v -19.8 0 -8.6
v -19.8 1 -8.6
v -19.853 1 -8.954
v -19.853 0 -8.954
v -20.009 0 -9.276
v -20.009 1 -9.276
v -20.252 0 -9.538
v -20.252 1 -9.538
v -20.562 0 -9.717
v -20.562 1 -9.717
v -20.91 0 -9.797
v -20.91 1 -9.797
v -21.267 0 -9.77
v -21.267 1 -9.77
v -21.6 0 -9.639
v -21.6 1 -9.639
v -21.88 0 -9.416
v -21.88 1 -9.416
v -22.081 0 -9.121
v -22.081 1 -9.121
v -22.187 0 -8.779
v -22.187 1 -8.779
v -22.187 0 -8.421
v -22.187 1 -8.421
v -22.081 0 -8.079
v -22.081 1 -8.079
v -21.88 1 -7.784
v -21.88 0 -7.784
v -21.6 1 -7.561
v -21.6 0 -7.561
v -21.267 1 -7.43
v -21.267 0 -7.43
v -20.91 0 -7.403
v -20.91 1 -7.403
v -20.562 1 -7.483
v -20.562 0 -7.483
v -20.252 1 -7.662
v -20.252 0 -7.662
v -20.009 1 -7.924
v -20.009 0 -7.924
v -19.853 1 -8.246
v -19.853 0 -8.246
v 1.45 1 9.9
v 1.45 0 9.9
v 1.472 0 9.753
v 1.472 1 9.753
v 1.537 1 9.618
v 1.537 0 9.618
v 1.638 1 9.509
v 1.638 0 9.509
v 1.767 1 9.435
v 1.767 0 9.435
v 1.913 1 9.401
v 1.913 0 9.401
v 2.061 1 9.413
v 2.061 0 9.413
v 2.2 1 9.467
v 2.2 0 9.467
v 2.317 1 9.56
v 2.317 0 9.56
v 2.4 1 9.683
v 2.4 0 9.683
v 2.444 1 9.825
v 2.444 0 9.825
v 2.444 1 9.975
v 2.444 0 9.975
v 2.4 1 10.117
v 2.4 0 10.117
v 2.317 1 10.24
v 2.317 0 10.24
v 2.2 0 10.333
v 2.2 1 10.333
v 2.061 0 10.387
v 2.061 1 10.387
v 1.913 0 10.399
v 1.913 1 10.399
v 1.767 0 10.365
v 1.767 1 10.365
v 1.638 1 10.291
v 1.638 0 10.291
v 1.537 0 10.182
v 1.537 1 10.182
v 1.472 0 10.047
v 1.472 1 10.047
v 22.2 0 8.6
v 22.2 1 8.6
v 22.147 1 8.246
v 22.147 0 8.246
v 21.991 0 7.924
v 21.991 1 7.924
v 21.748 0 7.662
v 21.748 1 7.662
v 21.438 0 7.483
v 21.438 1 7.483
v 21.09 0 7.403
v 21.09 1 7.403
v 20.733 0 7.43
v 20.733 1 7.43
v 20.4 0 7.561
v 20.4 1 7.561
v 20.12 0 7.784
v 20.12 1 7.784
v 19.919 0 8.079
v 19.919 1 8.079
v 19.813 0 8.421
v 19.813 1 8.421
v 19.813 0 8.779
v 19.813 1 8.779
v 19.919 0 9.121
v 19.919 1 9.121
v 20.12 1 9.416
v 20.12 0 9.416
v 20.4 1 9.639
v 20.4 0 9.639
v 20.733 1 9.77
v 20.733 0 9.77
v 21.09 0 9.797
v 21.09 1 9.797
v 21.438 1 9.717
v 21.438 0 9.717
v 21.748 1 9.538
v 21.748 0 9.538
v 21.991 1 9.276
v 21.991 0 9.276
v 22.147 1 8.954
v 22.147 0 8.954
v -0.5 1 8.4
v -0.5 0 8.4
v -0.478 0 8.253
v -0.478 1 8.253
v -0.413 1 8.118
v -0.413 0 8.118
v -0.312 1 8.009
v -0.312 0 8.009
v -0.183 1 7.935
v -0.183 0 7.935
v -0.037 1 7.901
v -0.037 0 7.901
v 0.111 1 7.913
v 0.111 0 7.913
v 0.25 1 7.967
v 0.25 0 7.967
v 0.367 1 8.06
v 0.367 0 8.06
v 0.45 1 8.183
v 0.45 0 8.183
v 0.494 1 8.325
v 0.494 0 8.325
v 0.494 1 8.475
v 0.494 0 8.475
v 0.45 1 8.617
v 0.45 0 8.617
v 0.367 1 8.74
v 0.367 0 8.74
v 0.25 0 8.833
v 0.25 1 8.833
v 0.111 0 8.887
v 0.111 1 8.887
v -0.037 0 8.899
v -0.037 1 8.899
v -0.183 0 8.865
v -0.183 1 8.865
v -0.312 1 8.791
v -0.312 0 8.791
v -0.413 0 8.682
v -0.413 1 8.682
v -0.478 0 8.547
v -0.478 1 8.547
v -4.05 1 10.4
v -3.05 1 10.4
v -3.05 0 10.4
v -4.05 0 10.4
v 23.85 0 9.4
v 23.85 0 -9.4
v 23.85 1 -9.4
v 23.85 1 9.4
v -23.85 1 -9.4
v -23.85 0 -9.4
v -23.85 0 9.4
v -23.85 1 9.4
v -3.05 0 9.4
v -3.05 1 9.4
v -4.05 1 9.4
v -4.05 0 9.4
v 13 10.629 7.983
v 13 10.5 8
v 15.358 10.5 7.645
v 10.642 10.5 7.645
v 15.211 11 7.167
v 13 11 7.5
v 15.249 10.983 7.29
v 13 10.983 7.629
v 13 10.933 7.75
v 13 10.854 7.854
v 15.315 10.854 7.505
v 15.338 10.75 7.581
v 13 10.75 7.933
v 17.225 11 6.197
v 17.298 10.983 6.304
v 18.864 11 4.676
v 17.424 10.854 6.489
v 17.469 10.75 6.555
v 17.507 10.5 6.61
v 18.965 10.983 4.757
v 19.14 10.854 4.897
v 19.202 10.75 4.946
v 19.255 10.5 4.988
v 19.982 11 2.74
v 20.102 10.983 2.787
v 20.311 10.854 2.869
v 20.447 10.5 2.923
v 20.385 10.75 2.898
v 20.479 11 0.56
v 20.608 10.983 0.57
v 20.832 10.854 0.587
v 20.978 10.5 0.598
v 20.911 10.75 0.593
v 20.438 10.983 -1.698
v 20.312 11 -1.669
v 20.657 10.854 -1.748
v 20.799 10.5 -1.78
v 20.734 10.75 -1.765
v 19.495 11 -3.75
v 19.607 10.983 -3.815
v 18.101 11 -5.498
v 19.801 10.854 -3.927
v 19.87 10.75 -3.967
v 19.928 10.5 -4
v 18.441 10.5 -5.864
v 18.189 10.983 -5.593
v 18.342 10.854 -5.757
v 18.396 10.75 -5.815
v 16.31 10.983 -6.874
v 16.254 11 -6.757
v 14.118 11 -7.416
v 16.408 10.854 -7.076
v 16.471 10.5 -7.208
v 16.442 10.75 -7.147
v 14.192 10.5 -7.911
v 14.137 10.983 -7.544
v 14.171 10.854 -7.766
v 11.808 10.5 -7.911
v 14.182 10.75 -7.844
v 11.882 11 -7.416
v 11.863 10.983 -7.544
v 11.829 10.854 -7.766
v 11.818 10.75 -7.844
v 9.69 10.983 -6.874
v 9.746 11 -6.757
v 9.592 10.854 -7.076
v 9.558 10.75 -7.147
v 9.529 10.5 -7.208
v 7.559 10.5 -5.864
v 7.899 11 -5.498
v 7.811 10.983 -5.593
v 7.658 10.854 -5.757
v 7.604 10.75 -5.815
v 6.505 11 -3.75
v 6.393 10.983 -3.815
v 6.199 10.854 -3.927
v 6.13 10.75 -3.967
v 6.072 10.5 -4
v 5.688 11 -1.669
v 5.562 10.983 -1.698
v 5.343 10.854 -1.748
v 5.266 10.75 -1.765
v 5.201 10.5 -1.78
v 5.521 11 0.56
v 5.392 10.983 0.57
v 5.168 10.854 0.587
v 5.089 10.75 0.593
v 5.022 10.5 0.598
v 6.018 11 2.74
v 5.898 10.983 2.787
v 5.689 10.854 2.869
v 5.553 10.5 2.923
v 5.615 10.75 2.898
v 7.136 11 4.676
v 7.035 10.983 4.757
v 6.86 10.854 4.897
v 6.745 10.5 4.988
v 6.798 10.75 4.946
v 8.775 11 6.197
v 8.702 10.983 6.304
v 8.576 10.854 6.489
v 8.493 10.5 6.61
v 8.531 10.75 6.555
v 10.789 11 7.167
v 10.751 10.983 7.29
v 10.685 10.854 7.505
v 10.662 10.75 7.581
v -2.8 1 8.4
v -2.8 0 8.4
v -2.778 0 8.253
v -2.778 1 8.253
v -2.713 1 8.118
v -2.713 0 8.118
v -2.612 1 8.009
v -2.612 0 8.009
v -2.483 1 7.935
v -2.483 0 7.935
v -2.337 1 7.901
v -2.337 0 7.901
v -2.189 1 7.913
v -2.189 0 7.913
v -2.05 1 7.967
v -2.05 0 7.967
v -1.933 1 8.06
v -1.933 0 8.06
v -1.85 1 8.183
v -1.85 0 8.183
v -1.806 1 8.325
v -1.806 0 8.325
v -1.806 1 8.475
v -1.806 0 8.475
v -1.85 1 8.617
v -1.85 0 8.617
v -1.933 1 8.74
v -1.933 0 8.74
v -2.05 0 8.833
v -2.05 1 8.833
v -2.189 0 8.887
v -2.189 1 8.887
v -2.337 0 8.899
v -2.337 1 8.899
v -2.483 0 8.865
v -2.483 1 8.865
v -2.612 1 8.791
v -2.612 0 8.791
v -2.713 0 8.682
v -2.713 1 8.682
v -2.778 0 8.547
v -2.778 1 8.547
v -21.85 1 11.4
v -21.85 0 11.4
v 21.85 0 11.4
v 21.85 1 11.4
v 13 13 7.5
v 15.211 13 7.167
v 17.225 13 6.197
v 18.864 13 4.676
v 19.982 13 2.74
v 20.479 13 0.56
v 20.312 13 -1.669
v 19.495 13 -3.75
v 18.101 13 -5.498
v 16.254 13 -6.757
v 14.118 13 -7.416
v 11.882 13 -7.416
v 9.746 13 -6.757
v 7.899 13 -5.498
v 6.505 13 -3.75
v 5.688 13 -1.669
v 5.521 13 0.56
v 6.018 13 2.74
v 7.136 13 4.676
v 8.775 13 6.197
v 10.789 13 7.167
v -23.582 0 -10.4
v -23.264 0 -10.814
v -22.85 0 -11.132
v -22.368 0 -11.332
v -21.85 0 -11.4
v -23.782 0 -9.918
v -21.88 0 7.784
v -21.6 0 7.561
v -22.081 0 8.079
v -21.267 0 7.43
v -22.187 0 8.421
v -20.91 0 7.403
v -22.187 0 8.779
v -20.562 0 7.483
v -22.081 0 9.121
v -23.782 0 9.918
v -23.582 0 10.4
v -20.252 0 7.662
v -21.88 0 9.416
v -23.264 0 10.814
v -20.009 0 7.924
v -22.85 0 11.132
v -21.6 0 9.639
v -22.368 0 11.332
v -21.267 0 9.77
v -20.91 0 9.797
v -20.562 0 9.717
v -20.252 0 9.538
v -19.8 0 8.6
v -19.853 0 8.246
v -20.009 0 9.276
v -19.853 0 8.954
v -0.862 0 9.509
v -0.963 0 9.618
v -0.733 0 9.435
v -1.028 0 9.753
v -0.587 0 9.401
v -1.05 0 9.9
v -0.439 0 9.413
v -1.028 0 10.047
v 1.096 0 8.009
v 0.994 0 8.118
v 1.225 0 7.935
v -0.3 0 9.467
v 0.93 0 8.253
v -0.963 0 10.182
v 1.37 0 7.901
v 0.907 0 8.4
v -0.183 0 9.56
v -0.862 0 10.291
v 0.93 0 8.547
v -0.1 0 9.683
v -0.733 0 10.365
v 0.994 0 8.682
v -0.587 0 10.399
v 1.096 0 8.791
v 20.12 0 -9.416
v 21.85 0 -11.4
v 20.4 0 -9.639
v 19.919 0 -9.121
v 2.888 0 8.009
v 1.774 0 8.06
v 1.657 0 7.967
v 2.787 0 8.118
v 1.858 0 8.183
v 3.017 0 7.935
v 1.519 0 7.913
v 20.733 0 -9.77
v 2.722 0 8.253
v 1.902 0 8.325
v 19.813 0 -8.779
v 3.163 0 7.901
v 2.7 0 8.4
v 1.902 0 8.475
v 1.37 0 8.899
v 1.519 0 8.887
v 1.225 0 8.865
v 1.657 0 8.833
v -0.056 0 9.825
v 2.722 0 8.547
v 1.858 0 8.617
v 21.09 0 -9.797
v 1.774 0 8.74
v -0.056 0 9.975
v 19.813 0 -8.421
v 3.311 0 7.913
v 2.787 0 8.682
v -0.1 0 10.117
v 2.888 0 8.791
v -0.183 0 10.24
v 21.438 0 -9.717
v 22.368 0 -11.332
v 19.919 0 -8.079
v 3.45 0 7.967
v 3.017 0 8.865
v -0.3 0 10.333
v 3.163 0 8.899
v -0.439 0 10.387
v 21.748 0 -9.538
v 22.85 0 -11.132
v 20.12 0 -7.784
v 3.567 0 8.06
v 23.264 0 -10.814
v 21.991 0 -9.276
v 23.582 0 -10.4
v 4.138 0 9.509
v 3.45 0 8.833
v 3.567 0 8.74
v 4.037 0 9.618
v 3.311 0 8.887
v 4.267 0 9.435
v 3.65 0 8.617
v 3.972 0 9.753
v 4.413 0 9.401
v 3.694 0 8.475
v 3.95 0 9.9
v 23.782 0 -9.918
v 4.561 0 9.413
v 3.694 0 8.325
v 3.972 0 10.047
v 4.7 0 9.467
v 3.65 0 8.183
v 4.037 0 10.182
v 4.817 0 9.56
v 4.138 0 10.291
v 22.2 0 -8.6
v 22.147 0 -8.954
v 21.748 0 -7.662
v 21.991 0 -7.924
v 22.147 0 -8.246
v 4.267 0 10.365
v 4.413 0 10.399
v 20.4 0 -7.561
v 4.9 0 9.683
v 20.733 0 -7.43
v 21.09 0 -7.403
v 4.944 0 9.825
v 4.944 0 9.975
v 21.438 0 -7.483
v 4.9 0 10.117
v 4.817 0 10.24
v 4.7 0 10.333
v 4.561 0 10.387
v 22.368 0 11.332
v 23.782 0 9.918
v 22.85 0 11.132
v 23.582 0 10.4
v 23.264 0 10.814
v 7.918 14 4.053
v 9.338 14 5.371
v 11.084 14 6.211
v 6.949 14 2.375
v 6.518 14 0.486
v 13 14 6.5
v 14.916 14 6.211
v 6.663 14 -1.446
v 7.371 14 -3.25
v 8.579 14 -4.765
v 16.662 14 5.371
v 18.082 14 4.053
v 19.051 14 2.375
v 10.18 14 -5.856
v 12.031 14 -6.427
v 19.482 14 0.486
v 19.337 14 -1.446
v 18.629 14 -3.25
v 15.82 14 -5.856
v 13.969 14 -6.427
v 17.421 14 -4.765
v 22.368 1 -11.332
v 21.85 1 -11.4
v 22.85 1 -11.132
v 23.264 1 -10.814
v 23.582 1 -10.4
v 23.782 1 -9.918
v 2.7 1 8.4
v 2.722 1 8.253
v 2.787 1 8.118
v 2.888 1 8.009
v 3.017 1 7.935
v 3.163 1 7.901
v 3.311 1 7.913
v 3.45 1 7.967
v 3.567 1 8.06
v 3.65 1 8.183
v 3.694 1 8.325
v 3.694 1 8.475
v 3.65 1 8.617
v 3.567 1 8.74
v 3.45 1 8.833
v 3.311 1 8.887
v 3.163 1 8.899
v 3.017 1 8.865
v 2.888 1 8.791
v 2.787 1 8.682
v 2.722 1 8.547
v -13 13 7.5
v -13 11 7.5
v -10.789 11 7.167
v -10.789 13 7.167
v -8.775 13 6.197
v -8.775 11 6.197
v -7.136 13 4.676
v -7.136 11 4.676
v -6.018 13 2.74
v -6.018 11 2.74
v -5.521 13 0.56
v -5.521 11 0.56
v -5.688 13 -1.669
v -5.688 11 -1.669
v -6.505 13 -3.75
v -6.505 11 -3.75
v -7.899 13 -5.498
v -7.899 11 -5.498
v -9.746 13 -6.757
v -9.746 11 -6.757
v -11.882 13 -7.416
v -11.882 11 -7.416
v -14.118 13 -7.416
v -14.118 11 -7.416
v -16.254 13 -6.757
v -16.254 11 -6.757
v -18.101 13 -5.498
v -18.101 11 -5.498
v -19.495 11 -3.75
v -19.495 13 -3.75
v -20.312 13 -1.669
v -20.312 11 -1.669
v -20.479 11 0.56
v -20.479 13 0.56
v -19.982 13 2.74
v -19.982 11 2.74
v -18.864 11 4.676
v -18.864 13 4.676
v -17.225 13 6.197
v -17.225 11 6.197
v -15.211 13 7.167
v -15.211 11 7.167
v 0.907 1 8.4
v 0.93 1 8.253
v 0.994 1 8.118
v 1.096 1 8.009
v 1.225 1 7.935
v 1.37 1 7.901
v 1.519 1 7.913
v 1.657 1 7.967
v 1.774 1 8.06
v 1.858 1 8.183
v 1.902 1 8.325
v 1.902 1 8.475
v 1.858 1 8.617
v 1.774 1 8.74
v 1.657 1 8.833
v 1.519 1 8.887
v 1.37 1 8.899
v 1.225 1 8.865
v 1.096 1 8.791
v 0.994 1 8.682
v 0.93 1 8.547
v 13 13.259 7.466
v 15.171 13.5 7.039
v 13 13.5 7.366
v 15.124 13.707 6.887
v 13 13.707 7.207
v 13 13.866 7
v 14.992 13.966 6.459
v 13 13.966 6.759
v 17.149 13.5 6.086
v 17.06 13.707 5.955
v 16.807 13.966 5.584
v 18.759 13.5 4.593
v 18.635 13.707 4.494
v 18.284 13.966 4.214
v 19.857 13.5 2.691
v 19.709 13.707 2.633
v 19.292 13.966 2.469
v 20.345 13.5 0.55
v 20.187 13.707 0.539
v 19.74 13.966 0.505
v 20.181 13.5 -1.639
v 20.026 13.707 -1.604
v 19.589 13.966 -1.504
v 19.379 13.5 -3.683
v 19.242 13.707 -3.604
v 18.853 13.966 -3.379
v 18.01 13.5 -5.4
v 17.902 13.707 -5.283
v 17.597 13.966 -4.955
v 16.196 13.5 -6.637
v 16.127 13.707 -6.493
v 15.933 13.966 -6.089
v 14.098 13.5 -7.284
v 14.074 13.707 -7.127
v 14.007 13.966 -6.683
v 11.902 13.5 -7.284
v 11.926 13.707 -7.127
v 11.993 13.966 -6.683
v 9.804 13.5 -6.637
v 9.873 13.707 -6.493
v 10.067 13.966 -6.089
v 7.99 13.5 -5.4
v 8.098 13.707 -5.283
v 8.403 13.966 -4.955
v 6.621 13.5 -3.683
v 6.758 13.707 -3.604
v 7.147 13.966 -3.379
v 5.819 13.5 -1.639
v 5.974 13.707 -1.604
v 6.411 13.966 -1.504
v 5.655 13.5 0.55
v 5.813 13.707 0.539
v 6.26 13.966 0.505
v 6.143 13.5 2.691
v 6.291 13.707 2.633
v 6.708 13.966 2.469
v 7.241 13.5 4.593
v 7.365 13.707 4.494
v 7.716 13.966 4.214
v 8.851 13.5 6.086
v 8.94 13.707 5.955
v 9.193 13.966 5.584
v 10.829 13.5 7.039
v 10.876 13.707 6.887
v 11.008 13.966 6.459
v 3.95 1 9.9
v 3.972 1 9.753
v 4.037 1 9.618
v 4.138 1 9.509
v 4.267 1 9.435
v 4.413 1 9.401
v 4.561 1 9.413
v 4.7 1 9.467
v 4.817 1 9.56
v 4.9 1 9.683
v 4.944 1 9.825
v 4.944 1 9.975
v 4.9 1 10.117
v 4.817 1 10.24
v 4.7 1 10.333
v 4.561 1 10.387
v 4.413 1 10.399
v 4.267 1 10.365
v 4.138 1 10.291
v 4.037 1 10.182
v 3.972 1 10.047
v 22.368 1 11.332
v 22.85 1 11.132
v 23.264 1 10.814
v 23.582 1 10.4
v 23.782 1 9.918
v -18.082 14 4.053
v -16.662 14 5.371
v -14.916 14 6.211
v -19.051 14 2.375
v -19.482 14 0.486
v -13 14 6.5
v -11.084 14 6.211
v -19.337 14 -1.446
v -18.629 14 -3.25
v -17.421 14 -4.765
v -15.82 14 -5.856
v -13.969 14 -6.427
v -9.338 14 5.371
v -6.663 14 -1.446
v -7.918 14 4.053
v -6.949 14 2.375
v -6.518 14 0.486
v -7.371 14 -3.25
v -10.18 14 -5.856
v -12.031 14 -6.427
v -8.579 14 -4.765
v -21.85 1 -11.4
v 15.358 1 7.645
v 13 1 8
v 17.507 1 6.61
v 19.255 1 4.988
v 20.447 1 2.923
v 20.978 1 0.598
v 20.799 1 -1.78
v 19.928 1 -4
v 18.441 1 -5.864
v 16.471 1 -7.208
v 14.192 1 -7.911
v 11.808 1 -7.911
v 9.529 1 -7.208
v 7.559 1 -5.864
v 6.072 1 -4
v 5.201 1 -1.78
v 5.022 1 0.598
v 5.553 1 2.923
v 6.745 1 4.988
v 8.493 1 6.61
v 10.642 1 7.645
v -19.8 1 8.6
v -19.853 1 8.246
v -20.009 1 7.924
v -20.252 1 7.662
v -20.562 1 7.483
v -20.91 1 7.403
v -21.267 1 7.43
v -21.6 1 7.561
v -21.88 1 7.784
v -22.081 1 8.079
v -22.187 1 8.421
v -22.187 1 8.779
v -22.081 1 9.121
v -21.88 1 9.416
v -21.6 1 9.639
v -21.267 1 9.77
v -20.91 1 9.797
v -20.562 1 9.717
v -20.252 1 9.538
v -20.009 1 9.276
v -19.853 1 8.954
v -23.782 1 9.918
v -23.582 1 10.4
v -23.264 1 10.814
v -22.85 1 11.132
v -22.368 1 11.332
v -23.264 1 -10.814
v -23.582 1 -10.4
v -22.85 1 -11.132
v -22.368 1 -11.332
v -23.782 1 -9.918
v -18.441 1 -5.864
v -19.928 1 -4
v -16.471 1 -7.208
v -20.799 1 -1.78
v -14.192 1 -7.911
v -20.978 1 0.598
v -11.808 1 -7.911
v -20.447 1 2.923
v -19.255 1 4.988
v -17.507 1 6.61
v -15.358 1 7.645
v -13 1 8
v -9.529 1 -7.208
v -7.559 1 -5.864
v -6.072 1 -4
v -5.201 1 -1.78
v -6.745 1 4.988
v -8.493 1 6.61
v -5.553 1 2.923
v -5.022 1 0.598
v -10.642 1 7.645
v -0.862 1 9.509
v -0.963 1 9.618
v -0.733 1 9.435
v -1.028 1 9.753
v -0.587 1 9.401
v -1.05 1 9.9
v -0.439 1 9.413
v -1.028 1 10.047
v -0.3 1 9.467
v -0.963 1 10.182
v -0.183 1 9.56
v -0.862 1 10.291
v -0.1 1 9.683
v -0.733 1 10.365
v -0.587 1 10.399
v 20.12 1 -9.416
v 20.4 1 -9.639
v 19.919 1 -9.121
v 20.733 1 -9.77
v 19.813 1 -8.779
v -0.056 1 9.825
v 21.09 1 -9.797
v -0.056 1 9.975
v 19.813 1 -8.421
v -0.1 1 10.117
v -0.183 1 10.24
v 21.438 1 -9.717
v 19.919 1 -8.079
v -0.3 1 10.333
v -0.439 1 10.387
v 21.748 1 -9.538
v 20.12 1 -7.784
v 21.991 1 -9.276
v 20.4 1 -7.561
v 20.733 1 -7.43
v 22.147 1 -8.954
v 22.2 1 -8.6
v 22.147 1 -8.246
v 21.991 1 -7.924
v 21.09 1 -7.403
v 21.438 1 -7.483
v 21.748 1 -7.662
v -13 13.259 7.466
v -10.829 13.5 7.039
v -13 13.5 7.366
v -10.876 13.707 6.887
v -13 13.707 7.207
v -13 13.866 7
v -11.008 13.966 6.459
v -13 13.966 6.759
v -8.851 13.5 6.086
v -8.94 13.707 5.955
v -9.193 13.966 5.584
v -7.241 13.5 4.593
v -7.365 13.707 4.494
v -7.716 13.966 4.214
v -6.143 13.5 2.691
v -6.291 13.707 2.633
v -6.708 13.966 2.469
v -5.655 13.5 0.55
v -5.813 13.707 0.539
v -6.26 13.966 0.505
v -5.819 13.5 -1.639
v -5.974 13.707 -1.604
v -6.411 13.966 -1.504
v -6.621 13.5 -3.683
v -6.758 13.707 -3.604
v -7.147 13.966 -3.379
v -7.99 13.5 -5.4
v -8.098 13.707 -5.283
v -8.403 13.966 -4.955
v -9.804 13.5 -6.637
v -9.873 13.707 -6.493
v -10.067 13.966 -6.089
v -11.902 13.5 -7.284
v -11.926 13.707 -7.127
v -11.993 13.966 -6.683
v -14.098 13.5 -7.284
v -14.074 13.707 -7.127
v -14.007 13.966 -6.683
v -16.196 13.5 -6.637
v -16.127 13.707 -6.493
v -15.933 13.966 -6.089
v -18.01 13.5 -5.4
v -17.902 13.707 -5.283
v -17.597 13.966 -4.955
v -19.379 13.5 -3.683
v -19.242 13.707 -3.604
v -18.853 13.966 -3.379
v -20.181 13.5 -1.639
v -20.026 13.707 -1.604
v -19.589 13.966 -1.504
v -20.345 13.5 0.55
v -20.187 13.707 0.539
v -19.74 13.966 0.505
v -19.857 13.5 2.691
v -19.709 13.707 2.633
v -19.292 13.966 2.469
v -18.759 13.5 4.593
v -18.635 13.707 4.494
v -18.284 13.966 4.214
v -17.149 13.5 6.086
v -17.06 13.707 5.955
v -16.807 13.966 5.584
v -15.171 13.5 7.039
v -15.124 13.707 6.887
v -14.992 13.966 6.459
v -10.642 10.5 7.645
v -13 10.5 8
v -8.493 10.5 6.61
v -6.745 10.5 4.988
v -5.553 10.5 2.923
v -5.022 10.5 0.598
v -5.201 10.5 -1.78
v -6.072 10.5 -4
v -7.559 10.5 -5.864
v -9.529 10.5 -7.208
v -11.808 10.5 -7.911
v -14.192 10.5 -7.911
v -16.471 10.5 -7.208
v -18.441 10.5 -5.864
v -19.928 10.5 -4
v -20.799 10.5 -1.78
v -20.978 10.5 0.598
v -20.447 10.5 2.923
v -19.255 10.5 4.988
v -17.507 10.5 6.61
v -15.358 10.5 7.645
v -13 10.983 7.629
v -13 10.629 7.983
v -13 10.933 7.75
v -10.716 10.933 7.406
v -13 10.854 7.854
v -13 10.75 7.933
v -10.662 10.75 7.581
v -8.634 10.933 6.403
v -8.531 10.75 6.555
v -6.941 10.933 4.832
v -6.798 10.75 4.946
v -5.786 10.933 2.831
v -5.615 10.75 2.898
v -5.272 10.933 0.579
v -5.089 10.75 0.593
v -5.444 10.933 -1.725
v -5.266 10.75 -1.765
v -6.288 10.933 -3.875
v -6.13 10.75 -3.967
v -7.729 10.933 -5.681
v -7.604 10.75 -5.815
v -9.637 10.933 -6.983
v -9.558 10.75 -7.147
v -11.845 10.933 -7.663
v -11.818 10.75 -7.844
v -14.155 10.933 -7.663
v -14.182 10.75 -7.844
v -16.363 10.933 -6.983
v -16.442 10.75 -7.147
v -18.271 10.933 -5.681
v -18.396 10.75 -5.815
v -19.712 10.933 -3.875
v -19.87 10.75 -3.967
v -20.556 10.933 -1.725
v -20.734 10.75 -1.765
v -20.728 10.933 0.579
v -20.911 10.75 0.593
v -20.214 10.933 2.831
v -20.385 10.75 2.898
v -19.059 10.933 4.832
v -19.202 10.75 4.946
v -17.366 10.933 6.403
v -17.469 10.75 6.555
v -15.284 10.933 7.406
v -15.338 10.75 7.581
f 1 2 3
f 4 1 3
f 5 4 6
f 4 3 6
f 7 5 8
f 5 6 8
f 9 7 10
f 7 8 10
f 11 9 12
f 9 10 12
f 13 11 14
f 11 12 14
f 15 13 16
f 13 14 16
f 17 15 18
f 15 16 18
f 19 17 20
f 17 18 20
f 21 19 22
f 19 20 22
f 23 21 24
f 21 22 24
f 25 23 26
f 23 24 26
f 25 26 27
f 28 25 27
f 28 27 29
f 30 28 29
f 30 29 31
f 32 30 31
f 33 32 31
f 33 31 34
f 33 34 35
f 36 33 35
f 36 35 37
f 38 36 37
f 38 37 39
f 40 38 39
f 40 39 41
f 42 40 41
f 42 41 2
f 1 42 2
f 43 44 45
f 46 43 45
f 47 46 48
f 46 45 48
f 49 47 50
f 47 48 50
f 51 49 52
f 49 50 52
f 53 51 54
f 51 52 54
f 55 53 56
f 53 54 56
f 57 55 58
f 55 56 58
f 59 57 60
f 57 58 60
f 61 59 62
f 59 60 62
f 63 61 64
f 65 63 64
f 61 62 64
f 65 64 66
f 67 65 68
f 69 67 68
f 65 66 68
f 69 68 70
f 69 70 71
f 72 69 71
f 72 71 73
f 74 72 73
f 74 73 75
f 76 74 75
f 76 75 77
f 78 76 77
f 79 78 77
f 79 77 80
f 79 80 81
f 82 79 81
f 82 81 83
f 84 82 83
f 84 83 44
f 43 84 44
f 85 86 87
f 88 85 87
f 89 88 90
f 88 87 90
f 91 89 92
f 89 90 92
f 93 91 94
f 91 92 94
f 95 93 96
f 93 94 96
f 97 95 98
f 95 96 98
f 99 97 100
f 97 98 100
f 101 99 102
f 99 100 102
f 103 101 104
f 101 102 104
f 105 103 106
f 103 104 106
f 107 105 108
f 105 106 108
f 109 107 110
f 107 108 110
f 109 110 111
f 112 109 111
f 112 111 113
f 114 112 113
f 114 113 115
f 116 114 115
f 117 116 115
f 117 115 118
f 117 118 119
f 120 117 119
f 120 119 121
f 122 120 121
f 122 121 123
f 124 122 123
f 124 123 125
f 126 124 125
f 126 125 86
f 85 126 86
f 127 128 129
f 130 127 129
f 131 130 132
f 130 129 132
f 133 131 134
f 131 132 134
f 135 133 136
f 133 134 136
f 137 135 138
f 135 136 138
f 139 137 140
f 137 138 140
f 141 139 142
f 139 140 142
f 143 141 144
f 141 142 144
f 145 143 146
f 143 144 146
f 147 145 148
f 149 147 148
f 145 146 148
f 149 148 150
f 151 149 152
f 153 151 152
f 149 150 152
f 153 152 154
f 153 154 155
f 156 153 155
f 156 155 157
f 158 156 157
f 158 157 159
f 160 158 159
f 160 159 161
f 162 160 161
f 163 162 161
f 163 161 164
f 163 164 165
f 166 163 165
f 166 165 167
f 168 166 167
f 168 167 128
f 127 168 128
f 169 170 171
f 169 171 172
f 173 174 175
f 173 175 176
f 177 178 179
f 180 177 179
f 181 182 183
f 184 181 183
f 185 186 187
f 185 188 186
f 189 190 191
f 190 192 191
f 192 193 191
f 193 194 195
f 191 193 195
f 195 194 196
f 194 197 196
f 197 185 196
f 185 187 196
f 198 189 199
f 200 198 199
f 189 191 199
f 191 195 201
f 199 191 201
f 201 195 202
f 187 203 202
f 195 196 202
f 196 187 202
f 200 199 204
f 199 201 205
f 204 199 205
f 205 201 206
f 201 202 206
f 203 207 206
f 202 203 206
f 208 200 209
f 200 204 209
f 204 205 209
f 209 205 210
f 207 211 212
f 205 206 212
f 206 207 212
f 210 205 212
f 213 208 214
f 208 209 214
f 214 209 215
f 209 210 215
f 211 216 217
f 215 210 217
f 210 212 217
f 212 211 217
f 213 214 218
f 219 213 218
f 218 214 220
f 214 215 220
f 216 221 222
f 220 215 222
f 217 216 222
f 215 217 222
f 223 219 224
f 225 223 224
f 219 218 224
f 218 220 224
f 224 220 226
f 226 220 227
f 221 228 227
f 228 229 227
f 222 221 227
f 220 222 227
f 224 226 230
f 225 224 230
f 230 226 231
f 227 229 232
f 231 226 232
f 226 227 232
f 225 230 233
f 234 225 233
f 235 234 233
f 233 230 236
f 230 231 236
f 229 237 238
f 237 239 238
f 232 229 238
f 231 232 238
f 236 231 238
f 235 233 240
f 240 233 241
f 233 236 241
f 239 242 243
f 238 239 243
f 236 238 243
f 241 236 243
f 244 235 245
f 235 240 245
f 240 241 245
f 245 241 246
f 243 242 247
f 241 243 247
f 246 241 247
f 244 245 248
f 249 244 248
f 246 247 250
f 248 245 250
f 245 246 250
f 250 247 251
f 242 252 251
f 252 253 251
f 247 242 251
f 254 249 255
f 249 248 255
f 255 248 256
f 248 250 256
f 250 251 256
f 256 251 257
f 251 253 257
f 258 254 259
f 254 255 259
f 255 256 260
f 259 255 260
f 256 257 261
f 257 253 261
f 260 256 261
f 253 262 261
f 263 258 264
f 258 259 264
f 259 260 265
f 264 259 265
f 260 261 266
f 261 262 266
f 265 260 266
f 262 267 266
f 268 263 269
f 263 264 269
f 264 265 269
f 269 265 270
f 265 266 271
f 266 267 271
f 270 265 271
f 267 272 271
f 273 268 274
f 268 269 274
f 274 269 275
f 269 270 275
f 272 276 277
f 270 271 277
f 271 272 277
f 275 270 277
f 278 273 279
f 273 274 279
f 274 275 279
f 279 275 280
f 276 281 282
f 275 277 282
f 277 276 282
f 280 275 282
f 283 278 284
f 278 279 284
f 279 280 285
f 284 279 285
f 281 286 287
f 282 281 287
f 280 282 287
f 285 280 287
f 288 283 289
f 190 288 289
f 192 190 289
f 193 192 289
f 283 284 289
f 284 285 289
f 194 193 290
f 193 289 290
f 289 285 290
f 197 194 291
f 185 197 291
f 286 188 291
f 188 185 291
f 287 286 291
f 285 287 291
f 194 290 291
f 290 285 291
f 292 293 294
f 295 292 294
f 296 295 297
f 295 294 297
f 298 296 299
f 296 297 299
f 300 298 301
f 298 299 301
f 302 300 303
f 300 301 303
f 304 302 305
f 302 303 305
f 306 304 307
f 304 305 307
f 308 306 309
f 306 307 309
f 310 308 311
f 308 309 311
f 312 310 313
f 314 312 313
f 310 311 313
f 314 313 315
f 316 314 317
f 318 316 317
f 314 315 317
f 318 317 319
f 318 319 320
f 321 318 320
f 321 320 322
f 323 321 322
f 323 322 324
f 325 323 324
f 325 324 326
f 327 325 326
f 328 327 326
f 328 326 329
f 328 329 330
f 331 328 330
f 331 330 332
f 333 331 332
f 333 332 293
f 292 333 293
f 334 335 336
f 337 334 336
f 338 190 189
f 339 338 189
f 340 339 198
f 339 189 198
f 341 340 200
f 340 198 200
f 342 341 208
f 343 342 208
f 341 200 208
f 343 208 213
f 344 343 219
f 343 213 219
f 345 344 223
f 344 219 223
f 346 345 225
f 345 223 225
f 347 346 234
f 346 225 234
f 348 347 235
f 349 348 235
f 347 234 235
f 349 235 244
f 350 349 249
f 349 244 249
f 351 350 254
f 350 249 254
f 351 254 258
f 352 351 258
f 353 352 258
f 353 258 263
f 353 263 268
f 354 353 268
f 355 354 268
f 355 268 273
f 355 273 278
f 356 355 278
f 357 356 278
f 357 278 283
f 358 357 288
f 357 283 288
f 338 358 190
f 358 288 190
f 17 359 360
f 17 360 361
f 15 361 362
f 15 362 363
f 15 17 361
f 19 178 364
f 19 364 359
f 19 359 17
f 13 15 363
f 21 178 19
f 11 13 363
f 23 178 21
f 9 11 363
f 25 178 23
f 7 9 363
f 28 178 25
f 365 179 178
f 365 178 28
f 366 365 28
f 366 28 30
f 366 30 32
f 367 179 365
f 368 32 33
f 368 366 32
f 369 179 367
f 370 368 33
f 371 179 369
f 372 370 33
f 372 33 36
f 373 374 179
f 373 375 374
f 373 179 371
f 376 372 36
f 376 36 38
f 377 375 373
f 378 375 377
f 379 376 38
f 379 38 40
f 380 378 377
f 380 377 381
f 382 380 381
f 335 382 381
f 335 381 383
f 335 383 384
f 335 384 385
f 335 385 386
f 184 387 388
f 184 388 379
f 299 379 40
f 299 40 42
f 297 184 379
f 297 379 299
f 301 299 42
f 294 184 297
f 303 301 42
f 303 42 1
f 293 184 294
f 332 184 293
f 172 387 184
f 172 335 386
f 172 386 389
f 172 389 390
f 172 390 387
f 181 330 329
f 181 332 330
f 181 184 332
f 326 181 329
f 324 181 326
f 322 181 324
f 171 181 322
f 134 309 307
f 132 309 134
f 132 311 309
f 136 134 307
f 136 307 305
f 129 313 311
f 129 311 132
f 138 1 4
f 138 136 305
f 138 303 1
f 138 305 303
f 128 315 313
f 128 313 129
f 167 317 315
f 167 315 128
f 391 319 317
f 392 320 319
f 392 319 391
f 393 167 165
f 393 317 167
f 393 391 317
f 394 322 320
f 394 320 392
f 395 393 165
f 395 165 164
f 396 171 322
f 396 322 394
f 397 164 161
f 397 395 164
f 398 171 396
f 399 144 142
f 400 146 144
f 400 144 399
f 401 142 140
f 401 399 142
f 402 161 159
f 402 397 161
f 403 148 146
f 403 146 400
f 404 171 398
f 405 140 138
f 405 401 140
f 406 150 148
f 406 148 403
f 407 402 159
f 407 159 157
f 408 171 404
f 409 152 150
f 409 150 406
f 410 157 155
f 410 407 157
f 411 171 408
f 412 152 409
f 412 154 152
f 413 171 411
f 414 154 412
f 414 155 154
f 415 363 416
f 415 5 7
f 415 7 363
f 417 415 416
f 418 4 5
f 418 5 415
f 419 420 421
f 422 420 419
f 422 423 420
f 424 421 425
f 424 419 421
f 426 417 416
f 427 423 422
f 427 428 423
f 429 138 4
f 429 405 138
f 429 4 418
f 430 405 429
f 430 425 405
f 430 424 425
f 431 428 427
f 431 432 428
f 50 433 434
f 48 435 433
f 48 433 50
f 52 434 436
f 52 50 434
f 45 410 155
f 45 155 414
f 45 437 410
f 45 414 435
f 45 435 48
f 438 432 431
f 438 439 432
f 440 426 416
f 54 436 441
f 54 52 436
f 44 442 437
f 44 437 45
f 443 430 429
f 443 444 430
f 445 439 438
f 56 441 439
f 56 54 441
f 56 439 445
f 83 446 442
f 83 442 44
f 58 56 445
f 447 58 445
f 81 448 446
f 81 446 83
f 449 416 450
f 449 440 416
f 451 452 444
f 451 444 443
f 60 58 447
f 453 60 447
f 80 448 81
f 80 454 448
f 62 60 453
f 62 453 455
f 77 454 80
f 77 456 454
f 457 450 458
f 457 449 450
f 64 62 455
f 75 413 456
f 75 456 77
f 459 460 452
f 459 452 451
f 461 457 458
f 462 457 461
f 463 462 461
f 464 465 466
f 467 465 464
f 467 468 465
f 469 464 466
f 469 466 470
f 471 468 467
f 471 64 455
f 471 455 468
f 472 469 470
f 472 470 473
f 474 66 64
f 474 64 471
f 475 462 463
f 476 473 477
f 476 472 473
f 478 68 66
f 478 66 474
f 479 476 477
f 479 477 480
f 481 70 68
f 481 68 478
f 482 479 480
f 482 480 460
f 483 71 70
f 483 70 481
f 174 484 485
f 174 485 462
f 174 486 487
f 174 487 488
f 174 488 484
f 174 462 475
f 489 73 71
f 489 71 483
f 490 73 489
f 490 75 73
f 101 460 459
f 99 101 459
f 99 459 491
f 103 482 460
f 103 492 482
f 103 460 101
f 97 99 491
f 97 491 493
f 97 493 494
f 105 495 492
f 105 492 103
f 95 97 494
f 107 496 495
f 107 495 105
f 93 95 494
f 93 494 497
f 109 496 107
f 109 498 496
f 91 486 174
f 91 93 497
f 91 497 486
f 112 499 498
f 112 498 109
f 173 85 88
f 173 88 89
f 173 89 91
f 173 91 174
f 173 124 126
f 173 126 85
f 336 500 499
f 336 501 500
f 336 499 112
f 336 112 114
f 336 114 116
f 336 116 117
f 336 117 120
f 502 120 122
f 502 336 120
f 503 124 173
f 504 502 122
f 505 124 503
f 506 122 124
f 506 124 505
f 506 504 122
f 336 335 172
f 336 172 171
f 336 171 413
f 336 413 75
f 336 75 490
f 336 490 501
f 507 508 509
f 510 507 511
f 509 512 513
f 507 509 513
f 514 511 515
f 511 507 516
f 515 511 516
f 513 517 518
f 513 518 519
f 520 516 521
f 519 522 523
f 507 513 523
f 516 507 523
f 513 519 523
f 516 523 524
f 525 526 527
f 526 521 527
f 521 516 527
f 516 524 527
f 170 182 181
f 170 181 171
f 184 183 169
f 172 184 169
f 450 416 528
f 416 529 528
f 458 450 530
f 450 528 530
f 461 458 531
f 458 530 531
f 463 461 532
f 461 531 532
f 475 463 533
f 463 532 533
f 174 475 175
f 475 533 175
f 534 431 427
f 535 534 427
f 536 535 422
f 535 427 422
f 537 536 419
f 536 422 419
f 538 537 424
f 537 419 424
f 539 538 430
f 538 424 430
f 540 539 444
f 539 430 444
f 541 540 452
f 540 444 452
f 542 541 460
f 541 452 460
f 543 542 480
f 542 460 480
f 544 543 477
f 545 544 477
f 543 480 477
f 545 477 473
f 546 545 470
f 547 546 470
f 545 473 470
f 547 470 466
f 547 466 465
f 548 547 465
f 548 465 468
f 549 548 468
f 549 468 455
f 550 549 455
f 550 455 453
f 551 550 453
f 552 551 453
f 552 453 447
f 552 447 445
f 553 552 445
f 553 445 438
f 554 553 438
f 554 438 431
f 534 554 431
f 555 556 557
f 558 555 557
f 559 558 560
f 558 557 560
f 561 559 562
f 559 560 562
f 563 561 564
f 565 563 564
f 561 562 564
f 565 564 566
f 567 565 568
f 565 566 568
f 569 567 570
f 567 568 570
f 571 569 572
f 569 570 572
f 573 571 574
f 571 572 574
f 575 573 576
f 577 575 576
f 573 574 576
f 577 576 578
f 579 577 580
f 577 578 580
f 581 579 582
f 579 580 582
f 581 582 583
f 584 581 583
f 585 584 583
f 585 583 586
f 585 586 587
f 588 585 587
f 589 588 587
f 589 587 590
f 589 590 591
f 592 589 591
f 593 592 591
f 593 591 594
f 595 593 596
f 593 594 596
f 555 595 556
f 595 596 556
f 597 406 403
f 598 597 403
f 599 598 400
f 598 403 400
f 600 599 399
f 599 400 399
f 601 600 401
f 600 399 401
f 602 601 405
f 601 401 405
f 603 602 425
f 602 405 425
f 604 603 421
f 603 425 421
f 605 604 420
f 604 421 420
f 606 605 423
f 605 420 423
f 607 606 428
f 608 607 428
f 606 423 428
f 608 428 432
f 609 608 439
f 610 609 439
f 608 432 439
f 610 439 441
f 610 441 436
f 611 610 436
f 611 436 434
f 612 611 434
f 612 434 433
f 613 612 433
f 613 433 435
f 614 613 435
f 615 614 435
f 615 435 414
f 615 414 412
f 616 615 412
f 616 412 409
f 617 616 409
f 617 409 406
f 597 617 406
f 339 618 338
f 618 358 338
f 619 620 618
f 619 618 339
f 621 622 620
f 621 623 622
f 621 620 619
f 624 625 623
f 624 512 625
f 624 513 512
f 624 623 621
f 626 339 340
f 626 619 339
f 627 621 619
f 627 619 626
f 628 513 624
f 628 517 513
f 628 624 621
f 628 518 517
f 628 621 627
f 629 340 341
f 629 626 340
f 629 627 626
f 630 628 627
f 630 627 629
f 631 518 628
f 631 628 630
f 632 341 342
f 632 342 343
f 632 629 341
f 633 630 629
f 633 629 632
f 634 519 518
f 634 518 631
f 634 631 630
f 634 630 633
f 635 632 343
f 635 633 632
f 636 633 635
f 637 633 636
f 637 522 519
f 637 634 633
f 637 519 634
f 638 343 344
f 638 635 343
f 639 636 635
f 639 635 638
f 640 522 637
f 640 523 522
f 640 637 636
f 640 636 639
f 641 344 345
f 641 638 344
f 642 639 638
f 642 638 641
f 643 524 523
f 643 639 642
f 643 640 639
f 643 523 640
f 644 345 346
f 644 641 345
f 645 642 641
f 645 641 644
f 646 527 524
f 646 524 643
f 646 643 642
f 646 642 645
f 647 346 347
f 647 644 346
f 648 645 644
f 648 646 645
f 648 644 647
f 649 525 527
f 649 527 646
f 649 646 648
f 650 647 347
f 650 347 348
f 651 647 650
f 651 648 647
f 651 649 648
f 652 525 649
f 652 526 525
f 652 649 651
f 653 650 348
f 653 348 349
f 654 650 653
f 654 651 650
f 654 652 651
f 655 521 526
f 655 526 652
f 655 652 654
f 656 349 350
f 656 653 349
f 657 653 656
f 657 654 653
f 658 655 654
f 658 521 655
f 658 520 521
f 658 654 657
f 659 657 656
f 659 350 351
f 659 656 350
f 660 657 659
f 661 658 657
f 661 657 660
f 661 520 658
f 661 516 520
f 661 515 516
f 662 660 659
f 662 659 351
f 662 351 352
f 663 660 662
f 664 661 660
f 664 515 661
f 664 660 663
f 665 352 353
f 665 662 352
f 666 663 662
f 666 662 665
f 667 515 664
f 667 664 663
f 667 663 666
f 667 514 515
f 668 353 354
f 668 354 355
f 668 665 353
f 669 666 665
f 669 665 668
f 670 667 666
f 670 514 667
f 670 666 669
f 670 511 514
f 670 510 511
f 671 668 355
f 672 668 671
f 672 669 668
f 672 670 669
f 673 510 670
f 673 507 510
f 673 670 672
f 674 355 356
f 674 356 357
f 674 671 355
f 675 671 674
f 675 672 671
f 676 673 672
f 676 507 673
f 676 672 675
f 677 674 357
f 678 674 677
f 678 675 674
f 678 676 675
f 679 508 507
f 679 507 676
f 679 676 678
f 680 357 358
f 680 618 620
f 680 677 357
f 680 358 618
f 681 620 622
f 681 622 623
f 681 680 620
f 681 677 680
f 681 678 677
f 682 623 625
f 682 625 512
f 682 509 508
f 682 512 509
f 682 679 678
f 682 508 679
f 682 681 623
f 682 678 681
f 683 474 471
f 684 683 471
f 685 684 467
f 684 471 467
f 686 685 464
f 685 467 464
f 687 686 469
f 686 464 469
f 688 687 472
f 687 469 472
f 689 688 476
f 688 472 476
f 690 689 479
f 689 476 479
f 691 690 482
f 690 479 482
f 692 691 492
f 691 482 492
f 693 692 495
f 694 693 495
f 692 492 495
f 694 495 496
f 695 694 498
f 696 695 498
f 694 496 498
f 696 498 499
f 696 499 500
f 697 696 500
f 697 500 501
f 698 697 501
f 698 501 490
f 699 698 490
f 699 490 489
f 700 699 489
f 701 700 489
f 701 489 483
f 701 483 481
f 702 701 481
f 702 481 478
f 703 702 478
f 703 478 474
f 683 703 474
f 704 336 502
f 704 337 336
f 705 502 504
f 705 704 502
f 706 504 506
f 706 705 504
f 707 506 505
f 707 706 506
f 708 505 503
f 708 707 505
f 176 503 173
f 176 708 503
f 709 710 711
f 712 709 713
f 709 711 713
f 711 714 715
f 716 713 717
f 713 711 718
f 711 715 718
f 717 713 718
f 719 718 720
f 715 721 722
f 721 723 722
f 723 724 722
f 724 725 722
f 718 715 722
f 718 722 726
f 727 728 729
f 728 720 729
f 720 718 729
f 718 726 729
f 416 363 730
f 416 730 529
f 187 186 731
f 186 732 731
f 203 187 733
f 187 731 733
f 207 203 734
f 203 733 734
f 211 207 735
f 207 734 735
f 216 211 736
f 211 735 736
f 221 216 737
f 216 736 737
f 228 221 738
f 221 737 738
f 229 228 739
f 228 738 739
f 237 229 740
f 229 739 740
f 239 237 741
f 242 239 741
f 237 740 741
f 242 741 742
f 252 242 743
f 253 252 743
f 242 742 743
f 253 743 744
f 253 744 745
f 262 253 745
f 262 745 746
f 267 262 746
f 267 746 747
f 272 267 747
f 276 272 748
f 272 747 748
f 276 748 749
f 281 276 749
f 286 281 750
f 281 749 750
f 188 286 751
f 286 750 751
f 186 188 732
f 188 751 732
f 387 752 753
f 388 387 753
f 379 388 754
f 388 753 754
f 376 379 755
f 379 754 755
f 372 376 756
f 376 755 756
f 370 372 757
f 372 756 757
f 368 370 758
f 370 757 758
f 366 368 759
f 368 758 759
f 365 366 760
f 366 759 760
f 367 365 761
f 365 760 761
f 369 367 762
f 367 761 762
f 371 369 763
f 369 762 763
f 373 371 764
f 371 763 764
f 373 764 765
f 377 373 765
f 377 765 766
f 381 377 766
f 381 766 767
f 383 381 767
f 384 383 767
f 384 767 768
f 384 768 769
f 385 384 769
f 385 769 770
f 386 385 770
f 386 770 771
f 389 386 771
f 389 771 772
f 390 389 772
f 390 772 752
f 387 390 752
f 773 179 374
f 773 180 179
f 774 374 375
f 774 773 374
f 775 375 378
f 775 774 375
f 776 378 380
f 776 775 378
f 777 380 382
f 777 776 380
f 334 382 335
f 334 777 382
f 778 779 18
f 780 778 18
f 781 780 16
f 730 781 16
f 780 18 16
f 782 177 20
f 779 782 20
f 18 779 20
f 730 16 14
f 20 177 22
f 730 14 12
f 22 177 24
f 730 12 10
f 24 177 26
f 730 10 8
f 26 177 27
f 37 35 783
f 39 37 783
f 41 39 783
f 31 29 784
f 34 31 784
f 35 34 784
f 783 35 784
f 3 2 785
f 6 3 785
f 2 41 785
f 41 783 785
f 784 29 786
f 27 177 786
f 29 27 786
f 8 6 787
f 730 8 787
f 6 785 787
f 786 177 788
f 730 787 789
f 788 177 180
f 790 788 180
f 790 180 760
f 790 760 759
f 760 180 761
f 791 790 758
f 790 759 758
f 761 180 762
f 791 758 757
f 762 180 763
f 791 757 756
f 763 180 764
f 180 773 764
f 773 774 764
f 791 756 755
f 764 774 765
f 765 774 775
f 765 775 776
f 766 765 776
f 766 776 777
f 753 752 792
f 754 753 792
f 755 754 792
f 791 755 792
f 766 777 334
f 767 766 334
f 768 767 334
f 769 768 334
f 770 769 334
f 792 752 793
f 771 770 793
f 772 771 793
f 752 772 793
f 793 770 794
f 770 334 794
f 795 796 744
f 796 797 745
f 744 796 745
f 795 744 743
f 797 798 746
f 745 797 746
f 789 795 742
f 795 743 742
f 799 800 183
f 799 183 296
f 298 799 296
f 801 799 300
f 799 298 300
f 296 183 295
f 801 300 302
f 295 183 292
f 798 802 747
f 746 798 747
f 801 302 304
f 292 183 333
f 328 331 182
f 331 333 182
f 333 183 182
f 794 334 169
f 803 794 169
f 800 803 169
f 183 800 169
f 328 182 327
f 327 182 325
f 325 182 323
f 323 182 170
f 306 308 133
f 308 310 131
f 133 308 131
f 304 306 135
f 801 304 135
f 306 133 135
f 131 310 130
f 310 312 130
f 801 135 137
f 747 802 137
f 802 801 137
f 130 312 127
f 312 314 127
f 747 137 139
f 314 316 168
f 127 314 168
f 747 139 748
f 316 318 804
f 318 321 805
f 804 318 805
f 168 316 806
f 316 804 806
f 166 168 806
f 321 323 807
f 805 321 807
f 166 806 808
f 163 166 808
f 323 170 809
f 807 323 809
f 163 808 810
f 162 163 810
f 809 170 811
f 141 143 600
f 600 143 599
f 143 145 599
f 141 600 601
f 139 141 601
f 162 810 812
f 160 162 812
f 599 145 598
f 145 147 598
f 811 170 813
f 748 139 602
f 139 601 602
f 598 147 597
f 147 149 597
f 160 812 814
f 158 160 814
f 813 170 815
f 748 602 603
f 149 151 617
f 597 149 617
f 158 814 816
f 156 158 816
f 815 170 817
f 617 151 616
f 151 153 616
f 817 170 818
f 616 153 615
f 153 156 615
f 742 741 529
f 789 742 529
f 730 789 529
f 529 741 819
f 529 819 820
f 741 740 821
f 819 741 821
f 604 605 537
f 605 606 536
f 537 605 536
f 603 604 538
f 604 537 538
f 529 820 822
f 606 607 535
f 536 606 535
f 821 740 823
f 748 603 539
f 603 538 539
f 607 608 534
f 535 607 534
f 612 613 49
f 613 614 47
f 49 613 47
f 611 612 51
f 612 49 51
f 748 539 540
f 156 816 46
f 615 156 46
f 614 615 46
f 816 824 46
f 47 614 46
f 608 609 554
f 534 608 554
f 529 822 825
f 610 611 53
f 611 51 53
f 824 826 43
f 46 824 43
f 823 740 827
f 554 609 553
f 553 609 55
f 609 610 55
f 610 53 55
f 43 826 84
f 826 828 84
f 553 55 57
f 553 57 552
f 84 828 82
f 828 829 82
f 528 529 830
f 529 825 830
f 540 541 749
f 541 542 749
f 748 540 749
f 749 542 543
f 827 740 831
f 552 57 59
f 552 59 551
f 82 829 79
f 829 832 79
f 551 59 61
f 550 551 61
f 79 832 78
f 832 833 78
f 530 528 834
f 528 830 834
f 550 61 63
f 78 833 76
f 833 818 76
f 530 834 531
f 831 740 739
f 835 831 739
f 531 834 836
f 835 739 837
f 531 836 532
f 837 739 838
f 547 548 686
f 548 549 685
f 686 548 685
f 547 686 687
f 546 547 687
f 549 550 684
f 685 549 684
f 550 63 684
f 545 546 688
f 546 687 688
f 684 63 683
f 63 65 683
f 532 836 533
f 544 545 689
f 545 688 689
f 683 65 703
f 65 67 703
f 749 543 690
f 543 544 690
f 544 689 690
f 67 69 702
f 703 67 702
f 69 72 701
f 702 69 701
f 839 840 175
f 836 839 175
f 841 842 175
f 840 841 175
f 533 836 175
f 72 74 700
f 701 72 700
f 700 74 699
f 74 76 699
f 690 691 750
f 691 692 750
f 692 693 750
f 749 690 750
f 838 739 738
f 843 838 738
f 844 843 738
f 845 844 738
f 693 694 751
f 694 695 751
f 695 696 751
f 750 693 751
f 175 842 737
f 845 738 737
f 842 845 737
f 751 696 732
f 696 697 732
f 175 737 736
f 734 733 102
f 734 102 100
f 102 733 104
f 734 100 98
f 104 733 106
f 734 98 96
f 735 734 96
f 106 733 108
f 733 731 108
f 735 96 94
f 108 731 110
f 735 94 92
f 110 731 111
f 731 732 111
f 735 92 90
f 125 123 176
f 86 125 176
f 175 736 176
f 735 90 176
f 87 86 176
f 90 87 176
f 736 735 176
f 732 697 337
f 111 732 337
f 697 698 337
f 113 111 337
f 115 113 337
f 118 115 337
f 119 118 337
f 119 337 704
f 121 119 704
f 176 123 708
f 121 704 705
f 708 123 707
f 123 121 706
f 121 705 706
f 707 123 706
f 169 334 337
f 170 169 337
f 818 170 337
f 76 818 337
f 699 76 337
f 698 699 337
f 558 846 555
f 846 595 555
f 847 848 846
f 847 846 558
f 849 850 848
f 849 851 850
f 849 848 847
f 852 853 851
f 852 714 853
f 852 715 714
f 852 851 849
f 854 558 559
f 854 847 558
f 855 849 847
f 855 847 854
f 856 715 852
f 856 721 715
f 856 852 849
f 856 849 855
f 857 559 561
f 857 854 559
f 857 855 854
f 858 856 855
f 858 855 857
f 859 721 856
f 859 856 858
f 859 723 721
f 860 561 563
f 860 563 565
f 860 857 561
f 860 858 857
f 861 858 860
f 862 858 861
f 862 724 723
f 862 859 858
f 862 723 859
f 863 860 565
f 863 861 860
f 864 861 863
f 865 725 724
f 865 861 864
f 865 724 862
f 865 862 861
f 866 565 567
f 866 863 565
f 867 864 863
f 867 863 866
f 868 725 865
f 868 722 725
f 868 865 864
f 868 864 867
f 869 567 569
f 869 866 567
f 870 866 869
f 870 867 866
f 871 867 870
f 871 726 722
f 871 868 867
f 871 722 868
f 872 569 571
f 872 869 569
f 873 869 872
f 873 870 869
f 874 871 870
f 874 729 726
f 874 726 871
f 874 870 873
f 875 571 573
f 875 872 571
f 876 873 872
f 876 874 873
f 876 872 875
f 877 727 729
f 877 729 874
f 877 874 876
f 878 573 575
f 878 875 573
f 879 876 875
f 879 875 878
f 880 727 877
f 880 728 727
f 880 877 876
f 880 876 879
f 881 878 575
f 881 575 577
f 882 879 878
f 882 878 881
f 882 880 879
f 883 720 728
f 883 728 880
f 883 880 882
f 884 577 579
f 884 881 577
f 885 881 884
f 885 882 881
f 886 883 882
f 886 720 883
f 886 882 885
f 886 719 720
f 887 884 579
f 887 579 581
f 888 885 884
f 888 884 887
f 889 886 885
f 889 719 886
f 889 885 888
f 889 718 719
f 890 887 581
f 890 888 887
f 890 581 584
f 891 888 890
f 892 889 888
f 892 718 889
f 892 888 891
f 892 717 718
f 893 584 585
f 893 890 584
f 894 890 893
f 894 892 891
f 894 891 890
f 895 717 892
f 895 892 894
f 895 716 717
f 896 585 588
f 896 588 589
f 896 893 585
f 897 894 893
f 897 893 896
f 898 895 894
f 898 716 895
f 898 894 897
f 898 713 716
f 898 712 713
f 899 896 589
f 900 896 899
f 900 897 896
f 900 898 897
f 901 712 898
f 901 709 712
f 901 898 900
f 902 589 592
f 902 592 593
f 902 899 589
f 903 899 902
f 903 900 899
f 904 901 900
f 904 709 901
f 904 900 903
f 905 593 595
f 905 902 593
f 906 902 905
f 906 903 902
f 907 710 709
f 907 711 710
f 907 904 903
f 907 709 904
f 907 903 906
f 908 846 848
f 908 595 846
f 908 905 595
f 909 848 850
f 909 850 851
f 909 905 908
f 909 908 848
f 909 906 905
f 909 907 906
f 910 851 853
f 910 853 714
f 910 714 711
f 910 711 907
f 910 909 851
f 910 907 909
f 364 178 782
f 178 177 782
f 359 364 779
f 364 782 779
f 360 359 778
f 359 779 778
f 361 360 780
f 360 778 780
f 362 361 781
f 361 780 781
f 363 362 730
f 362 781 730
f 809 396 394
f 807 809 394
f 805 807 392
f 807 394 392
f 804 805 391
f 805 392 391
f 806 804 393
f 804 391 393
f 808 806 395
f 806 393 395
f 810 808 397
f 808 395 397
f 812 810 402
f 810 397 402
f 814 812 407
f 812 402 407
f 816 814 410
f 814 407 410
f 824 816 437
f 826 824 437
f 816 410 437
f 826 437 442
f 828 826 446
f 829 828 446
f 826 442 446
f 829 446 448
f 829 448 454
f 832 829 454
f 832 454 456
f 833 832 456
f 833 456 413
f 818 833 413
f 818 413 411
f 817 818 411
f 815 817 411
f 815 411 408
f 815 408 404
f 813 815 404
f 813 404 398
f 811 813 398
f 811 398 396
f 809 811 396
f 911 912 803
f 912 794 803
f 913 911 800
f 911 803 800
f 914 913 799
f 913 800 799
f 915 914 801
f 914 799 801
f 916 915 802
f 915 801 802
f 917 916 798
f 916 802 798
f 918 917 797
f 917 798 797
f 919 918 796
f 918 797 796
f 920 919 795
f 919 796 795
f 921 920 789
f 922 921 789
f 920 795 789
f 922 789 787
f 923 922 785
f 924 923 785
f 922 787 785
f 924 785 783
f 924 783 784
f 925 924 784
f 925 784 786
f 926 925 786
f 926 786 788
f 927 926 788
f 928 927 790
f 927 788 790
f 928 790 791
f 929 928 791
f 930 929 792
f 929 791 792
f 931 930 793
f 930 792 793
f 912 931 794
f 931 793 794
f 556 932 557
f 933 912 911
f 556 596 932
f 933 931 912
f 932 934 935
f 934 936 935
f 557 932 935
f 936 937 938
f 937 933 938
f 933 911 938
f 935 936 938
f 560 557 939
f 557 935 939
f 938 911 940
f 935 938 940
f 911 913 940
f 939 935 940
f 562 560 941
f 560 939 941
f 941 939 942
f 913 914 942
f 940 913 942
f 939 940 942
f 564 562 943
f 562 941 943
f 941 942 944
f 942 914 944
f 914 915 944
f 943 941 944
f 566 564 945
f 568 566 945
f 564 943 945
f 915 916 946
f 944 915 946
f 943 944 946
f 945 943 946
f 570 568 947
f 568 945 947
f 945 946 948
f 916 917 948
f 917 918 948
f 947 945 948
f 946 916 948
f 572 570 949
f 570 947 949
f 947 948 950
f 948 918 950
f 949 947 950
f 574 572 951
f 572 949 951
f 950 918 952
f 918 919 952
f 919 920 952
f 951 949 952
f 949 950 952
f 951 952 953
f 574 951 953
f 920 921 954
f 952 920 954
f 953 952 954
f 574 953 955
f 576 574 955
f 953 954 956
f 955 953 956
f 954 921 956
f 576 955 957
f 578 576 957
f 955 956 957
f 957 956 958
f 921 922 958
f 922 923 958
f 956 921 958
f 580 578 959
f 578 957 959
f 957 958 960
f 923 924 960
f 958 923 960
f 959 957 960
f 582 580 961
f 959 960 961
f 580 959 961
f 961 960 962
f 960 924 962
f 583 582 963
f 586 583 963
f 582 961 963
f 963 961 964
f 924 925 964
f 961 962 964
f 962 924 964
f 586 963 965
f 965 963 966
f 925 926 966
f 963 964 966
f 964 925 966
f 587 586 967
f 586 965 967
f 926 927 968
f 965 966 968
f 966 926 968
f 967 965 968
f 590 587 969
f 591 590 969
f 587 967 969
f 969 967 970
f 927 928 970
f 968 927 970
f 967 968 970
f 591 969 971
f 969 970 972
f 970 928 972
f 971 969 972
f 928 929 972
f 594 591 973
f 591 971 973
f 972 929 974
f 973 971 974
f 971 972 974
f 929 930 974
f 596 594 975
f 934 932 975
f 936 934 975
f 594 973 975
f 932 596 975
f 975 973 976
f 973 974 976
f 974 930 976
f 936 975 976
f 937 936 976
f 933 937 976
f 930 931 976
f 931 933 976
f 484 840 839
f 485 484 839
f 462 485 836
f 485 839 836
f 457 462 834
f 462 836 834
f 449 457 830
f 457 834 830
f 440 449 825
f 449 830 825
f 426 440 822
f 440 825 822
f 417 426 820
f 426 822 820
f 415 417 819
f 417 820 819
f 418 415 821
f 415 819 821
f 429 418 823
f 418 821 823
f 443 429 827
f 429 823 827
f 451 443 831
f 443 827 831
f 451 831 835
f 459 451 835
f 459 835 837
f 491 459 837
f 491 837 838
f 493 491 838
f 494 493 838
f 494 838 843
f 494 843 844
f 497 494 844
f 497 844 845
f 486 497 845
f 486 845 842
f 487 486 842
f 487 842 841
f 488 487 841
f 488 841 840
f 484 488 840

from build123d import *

# Parameters (mm, degrees)
SKETCH_1_W                  = 47.7
SKETCH_1_H                  = 22.8
EXTRUDE_1_DEPTH             = 1
SKETCH_2_W                  = 1
SKETCH_2_H                  = 1
CUT_EXTRUDE_1_DEPTH         = 27.453402428
HOLE_WIZARD_1_0_1_1_D       = 1
HOLE_WIZARD_2_4_2_4_1_D     = 2.4
HOLE_WIZARD_2_4_2_4_1_DEPTH = 14
FILLET_1_R                  = 1
FILLET_2_R                  = 2


with BuildPart() as part:
    # 草图1 → 凸台-拉伸1 (new body)
    with BuildSketch(Plane.XZ):
        Rectangle(SKETCH_1_W, SKETCH_1_H)
    extrude(amount=-EXTRUDE_1_DEPTH)

    # 草图2 → 切除-拉伸1 (cut, through all)
    with BuildSketch(Plane(origin=(0, 1, 0), x_dir=(-1, 0, 0), z_dir=(0, 1, 0))):
        with Locations((3.55, 9.9)):
            Rectangle(SKETCH_2_W, SKETCH_2_H)
    extrude(amount=-CUT_EXTRUDE_1_DEPTH, mode=Mode.SUBTRACT)

    # 草图3 → 旋转1 (revolve)
    with BuildSketch(Plane(origin=(0, 0, 0), x_dir=(-1, 0, 0), z_dir=(0, 0, -1)), mode=Mode.PRIVATE) as revolve_1_sk:
        with BuildLine():
            Line((-21, 1), (-13, 1))
            Line((-13, 1), (-13, 14))
            Line((-13, 14), (-20.5, 14))
            Line((-20.5, 14), (-20.5, 11))
            ThreePointArc((-20.5, 11), (-20.853553391, 10.853553391), (-21, 10.5))
            Line((-21, 10.5), (-21, 1))
        make_face()
    revolve(revolve_1_sk.sketch.rotate(Axis((13, 1, 0), (0, 1, 0)), 270), axis=Axis((13, 1, 0), (0, 1, 0)))

    # 草图4 → 旋转2 (revolve)
    with BuildSketch(Plane(origin=(0, 0, 0), x_dir=(-1, 0, 0), z_dir=(0, 0, -1)), mode=Mode.PRIVATE) as revolve_2_sk:
        with BuildLine():
            Line((5, 1), (13, 1))
            Line((13, 1), (13, 14))
            Line((13, 14), (5.5, 14))
            Line((5.5, 14), (5.5, 11))
            ThreePointArc((5.5, 11), (5.146446609, 10.853553391), (5, 10.5))
            Line((5, 10.5), (5, 1))
        make_face()
    revolve(revolve_2_sk.sketch.rotate(Axis((-13, 1, 0), (0, 1, 0)), 270), axis=Axis((-13, 1, 0), (0, 1, 0)))

    # Ø1.0 (1) 直径孔1 (through all)
    with Locations(Plane(origin=(0, 1, 0), x_dir=(1, 0, 0), z_dir=(0, 1, 0))):
        with Locations((-0.55, -9.9), (1.95, -9.9), (4.45, -9.9), (-2.3, -8.4), (0, -8.4), (3.2, -8.4), (1.407287445, -8.4)):
            Hole(HOLE_WIZARD_1_0_1_1_D / 2)

    # Ø2.4 (2.4) 直径孔1
    with Locations(Plane(origin=(0, 0, 0), x_dir=(-1, 0, 0), z_dir=(0, -1, 0))):
        with Locations((21, 8.6), (-21, 8.6), (-21, -8.6), (21, -8.6)):
            Hole(HOLE_WIZARD_2_4_2_4_1_D / 2, depth=HOLE_WIZARD_2_4_2_4_1_DEPTH)

    # 圆角1
    fillet_1_edges = [part.edges().sort_by_distance(p)[0] for p in [
        (13, 14, -7.5),
        (-13, 14, -7.5),
    ]]
    fillet(fillet_1_edges, radius=FILLET_1_R)

    # 圆角2
    fillet_2_edges = [part.edges().sort_by_distance(p)[0] for p in [
        (-23.85, 0.5, 11.4),
        (23.85, 0.5, 11.4),
        (23.85, 0.5, -11.4),
        (-23.85, 0.5, -11.4),
    ]]
    fillet(fillet_2_edges, radius=FILLET_2_R)


solid = part.part
